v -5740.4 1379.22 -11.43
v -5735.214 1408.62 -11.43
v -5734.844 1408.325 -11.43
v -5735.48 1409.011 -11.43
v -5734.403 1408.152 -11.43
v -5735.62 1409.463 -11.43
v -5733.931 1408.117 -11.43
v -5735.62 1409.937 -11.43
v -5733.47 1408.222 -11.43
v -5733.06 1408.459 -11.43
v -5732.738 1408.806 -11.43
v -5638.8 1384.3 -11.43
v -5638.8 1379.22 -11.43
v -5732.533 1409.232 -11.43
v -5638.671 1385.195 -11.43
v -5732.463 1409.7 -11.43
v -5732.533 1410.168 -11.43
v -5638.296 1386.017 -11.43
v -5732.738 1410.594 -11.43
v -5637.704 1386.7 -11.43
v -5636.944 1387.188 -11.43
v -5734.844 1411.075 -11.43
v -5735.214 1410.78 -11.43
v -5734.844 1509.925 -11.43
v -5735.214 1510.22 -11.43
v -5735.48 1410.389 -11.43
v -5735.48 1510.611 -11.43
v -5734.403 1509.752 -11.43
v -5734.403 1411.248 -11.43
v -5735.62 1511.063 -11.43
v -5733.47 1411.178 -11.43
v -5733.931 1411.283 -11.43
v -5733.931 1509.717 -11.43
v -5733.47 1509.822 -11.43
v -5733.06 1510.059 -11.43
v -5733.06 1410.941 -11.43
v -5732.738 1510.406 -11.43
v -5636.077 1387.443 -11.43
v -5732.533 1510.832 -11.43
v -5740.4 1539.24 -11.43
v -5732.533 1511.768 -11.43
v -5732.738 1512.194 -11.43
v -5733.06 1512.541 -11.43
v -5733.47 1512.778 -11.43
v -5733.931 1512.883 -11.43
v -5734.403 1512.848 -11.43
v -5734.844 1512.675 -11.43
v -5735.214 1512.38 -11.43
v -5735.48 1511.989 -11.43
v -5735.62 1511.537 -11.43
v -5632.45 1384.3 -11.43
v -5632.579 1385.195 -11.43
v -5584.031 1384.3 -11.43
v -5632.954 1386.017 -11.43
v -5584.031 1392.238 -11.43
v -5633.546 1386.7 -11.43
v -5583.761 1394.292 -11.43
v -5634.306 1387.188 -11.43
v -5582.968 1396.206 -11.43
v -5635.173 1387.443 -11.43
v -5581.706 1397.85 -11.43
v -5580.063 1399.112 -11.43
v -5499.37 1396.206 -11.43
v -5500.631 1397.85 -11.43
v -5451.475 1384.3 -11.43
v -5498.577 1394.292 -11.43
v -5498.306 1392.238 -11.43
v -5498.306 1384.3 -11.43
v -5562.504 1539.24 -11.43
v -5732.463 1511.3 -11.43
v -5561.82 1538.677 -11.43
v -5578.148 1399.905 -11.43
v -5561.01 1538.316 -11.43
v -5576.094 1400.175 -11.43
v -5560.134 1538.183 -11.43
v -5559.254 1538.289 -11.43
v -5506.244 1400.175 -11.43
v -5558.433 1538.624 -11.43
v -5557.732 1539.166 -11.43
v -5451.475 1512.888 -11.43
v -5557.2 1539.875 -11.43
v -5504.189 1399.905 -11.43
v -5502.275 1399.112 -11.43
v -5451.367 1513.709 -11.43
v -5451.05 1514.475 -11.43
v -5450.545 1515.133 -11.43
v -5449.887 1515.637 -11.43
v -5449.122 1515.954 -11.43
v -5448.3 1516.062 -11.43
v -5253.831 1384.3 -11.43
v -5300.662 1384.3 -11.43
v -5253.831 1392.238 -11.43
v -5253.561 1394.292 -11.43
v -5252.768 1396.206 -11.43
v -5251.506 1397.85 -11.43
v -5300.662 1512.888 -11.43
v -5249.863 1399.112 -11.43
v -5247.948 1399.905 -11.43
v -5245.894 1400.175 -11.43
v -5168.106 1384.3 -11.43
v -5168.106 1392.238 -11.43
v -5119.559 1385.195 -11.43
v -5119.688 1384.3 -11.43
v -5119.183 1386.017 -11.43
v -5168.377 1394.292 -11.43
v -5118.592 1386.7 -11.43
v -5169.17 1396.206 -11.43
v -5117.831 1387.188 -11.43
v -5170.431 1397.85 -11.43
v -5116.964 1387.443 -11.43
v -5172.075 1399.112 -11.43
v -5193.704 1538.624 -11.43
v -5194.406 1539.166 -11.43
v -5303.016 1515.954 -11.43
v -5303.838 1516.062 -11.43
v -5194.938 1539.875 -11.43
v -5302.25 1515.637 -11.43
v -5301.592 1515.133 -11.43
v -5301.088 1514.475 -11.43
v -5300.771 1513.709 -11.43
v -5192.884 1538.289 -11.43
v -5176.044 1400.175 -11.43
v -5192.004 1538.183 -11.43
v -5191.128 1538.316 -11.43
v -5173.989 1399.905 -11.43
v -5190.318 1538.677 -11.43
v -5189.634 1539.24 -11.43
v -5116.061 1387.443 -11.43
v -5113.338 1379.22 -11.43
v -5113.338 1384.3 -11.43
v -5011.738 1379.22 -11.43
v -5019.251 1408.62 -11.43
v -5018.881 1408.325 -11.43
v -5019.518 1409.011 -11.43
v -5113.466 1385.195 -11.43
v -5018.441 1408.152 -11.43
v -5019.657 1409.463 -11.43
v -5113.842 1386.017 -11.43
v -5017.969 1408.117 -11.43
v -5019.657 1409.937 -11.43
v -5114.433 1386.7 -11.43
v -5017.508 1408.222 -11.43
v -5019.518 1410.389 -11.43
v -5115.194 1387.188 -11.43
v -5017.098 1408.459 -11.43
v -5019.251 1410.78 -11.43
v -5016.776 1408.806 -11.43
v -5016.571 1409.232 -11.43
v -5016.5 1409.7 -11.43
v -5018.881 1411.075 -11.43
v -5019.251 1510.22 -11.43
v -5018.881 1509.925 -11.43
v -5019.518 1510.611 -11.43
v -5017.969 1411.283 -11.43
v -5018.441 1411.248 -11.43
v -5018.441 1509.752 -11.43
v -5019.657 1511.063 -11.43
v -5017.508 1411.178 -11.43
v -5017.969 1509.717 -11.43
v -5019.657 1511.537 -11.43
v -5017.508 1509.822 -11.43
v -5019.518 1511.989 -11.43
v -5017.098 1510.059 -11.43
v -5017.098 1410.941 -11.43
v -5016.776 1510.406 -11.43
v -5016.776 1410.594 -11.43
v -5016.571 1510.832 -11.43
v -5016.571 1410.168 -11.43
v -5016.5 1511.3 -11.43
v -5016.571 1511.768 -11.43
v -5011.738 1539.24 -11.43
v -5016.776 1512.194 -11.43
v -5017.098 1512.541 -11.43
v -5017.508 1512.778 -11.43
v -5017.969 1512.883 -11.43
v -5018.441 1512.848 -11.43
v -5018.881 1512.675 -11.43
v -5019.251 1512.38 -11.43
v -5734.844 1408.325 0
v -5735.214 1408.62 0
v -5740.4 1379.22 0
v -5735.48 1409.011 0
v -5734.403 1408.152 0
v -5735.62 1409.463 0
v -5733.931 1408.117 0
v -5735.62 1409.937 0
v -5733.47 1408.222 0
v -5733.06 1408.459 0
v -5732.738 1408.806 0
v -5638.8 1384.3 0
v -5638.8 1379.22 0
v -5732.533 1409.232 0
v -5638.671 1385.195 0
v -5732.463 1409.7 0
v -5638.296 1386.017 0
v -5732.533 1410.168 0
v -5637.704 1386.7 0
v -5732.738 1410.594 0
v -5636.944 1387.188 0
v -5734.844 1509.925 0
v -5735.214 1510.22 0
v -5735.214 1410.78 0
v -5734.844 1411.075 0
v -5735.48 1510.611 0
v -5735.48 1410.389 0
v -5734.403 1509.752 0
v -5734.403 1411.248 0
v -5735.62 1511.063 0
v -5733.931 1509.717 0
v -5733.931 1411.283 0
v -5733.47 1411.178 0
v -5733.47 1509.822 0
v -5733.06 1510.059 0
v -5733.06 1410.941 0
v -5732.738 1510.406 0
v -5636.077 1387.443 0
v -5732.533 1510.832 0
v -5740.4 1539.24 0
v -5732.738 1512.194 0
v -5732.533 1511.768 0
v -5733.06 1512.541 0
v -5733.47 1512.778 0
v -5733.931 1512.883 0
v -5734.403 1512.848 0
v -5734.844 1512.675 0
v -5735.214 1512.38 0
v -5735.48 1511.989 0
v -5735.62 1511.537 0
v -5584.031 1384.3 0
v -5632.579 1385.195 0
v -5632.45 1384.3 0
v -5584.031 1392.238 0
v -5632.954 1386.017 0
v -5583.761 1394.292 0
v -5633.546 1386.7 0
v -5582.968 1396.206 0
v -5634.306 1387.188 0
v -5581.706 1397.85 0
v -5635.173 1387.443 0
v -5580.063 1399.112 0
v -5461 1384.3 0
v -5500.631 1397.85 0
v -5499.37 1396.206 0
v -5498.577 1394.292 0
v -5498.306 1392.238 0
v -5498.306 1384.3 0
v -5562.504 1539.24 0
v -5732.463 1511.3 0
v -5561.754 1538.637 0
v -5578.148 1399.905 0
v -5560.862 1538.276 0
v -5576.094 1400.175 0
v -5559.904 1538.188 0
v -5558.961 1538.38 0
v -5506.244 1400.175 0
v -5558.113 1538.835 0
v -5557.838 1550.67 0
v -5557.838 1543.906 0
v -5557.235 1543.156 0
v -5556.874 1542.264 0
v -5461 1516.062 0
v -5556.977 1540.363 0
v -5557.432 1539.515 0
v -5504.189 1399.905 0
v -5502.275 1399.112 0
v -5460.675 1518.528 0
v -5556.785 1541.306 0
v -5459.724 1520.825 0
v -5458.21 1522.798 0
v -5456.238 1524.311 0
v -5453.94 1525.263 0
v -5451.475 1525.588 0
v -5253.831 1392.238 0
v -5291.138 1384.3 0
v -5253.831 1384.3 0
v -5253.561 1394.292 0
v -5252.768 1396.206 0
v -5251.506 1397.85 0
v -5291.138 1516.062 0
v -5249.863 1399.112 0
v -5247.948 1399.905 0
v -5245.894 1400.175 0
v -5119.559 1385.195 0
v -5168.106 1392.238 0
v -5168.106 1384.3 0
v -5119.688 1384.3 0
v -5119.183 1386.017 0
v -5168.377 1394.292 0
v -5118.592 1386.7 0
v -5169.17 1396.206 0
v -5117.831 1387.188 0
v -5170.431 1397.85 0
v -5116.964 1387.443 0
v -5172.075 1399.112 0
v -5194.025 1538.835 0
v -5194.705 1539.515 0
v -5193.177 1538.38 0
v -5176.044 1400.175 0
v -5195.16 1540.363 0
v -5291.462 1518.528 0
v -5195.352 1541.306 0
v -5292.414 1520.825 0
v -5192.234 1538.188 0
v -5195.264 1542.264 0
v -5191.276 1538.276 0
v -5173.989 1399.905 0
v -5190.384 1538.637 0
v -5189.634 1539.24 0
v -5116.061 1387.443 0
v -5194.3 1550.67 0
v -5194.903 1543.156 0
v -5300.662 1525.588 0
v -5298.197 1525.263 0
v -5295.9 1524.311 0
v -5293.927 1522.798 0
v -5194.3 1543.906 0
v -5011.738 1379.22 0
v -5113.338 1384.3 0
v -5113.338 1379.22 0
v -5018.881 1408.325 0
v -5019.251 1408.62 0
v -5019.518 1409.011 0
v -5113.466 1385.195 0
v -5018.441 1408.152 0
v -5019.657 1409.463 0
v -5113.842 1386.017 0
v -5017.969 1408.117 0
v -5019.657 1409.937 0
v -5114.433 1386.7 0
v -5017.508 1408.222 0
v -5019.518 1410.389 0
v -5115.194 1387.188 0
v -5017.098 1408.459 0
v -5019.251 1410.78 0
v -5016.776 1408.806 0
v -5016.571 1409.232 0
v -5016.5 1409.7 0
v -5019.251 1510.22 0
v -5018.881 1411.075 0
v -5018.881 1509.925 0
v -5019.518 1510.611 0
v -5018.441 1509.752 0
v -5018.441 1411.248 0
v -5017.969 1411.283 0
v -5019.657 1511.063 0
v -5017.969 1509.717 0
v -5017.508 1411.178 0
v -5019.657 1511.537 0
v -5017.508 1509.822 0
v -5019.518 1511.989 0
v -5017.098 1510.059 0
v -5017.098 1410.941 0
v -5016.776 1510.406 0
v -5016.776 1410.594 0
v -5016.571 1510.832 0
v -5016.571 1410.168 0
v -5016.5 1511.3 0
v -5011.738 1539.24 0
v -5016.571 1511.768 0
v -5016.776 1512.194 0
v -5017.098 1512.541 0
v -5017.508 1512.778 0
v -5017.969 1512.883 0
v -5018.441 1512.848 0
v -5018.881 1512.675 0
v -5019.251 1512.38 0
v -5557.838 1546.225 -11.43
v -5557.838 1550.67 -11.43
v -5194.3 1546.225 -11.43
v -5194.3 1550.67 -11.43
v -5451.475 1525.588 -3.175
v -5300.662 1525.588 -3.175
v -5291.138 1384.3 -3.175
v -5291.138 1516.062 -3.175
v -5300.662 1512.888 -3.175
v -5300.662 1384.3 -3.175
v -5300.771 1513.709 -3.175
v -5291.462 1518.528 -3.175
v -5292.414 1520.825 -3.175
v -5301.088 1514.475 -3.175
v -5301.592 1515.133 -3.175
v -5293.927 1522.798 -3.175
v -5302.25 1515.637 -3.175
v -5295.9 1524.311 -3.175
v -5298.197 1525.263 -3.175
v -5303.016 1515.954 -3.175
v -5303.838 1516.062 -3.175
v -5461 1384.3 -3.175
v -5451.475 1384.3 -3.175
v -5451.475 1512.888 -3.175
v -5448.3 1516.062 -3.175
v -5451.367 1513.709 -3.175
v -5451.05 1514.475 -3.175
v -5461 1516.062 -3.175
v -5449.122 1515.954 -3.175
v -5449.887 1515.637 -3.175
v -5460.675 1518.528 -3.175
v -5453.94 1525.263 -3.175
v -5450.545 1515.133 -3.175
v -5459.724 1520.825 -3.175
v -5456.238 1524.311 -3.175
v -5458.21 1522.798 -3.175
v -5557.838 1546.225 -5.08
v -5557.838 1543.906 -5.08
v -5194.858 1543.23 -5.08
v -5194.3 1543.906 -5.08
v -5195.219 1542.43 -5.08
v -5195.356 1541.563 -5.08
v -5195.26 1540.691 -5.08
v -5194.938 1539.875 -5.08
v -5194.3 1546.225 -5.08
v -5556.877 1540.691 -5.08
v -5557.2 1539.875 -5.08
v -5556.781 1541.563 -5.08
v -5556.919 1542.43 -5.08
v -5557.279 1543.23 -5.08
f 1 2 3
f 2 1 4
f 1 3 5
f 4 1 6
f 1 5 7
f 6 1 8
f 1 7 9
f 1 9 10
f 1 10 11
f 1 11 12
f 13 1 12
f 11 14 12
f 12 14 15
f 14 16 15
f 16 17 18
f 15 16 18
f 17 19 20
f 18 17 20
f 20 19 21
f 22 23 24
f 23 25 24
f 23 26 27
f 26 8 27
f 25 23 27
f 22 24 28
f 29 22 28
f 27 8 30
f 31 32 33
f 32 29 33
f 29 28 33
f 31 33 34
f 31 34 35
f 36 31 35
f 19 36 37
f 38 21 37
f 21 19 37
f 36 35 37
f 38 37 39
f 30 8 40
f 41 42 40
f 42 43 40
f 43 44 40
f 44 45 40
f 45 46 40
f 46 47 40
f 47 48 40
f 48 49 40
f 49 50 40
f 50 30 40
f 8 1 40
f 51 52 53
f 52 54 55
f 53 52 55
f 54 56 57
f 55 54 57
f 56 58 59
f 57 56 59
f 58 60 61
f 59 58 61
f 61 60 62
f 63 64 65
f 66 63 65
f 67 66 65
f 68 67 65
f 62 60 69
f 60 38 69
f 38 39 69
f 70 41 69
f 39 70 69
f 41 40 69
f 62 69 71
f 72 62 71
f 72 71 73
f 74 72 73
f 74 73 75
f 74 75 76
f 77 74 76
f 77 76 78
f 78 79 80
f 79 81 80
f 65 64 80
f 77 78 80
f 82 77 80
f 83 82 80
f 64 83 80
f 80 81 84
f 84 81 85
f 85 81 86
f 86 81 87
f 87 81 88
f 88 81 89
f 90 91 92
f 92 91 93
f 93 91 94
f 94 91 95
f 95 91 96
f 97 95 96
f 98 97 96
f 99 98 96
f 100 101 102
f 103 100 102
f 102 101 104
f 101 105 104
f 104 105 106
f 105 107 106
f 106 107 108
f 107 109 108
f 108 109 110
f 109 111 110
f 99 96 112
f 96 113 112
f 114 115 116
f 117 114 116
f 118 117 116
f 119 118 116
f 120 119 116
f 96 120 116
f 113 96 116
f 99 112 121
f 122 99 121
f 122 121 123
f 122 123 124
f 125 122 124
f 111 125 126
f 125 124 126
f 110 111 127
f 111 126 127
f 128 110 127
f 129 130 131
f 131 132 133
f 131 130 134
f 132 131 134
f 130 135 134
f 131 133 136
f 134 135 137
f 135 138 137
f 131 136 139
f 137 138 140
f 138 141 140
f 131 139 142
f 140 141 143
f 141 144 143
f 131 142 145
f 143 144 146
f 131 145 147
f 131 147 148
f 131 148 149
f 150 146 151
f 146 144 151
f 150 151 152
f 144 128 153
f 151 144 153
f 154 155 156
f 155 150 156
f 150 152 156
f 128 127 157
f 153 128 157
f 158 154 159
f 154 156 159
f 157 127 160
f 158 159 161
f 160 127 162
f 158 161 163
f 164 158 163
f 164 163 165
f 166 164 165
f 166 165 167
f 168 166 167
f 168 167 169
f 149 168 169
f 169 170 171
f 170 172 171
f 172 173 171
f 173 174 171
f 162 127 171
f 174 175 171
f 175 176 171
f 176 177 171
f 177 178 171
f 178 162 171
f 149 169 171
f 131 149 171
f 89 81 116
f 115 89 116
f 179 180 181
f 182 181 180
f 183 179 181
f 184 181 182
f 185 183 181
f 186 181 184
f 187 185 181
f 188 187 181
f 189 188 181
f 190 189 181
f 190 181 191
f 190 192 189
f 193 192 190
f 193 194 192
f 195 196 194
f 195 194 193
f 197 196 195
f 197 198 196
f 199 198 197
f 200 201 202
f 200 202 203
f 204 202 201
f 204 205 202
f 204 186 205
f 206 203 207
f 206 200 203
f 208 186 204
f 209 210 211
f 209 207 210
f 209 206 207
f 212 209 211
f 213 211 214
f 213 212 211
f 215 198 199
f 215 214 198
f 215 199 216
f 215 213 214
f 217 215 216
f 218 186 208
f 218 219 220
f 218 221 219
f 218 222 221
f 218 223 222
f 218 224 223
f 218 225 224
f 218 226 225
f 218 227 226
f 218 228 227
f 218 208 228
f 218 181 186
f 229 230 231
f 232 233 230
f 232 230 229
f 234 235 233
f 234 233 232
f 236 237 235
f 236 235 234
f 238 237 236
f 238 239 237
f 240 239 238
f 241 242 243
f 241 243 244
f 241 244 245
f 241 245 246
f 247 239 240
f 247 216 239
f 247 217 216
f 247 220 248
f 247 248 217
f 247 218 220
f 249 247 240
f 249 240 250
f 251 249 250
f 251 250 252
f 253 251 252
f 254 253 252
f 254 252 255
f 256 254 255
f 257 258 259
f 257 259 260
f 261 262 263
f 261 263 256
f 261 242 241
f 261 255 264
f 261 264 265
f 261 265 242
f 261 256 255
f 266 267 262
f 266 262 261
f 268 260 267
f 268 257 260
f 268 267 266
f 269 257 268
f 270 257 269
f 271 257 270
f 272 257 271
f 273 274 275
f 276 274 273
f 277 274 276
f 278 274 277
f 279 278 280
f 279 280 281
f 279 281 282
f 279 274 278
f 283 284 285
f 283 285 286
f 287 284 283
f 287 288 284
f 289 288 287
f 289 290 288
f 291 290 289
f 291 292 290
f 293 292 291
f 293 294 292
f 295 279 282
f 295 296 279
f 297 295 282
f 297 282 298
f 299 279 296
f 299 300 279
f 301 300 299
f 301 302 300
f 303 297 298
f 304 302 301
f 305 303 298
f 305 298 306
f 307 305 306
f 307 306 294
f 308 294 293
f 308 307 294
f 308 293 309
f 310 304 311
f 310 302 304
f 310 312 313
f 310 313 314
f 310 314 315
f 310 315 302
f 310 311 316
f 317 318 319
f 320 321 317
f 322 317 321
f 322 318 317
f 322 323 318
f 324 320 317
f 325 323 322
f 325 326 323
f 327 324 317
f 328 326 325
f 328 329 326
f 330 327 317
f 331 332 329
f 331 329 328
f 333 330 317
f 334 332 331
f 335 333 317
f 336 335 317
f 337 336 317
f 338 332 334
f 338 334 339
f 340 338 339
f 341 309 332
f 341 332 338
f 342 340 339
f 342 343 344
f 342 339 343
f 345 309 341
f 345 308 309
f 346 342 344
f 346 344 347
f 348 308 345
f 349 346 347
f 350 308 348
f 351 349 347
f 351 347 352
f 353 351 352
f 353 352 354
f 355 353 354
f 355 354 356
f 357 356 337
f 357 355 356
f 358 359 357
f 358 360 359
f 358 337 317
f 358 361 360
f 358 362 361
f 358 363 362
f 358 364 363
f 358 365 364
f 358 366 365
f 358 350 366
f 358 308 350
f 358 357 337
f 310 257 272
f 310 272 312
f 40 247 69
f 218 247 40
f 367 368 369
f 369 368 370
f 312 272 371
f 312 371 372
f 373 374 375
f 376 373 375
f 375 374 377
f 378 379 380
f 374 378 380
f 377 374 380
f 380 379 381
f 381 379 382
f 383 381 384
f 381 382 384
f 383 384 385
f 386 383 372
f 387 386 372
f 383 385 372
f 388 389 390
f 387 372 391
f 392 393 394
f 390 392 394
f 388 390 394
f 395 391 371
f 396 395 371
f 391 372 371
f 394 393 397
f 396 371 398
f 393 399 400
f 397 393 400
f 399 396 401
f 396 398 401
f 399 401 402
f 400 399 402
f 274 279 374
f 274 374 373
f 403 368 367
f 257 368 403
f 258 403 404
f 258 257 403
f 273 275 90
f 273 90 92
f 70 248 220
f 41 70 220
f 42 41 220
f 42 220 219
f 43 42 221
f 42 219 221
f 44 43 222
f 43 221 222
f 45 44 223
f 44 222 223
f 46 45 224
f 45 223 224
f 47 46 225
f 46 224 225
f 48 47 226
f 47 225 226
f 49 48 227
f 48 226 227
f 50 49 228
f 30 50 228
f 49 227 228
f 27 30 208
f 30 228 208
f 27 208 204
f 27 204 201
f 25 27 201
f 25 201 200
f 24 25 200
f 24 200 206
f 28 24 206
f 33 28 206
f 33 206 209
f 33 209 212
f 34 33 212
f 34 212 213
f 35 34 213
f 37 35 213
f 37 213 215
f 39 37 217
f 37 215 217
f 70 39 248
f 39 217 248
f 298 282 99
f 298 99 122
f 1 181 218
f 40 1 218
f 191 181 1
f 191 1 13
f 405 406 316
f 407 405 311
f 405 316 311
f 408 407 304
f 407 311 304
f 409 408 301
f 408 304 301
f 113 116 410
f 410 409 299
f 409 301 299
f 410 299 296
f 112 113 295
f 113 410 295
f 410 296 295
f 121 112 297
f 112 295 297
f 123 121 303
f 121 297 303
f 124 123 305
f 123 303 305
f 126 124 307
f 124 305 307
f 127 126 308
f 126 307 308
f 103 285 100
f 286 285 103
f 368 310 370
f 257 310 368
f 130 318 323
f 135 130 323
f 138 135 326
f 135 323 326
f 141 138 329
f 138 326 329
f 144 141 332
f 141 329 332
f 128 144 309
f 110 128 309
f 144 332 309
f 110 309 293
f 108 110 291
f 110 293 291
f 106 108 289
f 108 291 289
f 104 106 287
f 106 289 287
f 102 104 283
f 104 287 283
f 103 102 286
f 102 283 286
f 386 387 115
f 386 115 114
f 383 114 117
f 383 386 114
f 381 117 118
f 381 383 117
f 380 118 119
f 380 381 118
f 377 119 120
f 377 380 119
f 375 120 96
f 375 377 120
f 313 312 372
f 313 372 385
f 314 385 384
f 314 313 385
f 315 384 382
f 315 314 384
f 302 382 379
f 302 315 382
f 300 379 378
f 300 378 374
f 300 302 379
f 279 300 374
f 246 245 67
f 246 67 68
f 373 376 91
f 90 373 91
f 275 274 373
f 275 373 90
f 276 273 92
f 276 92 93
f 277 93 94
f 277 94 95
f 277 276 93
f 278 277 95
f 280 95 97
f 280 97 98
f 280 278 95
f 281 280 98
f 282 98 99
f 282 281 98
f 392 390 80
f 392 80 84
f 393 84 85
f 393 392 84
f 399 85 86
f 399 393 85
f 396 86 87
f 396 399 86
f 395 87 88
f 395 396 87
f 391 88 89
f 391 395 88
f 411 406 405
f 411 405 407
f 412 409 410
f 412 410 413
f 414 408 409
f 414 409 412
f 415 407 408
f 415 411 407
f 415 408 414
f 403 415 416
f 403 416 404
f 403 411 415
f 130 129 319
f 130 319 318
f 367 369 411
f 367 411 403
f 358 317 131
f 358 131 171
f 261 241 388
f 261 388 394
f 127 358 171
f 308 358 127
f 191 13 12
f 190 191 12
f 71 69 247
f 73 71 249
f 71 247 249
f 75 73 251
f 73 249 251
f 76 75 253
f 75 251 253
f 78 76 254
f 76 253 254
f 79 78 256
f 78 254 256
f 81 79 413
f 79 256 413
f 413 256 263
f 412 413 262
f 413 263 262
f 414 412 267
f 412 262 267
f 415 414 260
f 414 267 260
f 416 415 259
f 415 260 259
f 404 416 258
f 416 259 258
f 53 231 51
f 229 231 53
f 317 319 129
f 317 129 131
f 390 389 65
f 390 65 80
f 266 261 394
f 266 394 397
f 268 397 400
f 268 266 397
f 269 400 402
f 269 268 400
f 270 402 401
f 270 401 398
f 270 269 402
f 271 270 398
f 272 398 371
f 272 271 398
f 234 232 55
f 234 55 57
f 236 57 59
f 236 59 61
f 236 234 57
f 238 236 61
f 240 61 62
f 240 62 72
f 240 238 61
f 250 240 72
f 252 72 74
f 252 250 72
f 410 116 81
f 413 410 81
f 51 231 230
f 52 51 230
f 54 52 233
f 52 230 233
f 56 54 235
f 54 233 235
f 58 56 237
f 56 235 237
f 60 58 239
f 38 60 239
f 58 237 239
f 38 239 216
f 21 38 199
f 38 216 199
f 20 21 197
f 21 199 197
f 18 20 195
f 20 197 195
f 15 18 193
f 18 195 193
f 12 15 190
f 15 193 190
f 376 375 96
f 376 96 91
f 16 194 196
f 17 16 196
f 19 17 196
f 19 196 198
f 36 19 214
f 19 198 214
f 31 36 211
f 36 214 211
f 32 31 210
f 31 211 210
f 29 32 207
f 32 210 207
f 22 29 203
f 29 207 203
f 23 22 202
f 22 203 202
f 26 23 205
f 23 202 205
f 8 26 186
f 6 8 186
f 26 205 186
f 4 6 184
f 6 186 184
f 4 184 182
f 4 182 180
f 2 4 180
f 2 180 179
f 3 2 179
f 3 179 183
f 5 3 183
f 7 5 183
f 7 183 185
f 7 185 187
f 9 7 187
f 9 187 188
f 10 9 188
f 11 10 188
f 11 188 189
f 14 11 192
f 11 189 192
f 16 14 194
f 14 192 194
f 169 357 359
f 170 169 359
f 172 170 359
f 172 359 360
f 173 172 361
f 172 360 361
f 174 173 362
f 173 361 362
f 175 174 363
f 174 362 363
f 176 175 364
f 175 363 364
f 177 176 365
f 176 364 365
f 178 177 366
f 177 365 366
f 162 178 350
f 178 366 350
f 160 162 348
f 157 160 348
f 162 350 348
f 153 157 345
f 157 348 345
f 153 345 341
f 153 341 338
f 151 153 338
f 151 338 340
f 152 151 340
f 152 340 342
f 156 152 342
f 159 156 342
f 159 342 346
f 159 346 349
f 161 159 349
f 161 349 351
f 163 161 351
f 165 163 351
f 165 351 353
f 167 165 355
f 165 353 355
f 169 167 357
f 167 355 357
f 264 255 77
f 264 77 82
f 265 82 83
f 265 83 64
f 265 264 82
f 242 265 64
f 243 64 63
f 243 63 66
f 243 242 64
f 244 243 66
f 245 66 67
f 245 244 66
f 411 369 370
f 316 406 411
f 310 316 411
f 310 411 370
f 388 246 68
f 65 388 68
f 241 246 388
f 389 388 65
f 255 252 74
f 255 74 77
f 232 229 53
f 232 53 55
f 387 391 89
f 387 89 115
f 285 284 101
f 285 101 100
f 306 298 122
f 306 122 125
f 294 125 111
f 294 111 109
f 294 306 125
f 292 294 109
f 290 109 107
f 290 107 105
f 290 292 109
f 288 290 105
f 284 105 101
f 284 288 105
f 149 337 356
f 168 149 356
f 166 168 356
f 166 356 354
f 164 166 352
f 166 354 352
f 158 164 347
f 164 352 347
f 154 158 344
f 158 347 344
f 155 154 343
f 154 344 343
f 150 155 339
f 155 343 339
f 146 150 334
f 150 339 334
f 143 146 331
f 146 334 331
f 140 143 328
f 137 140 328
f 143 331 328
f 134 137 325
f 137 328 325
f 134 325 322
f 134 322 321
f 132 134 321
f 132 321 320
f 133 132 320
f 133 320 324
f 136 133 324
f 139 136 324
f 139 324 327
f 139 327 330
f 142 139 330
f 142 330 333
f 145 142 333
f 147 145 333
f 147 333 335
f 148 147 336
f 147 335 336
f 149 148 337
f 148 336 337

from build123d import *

# Parameters (mm, degrees)
THICKNESS_MAINOUTLINE_DEPTH = 11.43
CORNERPOCKETRADIUS_R        = 3.302
CUT_EXTRUDE4_DEPTH          = 11.43
FLANGEDEPTH_DEPTH           = 3.175
SCREWHOLES_R                = 1.5875
CUT_EXTRUDE2_DEPTH          = 11.43
PLEXCHANNEL_W               = 363.5375
PLEXCHANNEL_H               = 6.35
PLEXCHANNEL_DEPTH_DEPTH     = 6.35
SKETCH7_W                   = 101.6
SKETCH7_H                   = 5.08
EXTRUDE2_DEPTH              = 11.43
SKETCH8_R                   = 3.175
CUT_EXTRUDE5_DEPTH          = 11.43


with BuildPart() as part:
    # MainOutline → Thickness_MainOutline (new body)
    with BuildSketch(Plane.XY):
        with BuildLine():
            Line((-5740.4, 1539.24), (-5740.4, 1384.3))
            Line((-5740.4, 1384.3), (-5584.03125, 1384.3))
            Line((-5584.03125, 1384.3), (-5584.03125, 1392.2375))
            ThreePointArc((-5584.03125, 1392.2375), (-5581.706410076, 1397.850160076), (-5576.09375, 1400.175))
            Line((-5576.09375, 1400.175), (-5506.24375, 1400.175))
            ThreePointArc((-5506.24375, 1400.175), (-5500.631089924, 1397.850160076), (-5498.30625, 1392.2375))
            Line((-5498.30625, 1392.2375), (-5498.30625, 1384.3))
            Line((-5498.30625, 1384.3), (-5451.475, 1384.3))
            Line((-5451.475, 1384.3), (-5451.475, 1512.8875))
            ThreePointArc((-5451.475, 1512.8875), (-5450.54506403, 1515.13256403), (-5448.3, 1516.0625))
            Line((-5448.3, 1516.0625), (-5303.8375, 1516.0625))
            ThreePointArc((-5303.8375, 1516.0625), (-5301.59243597, 1515.13256403), (-5300.6625, 1512.8875))
            Line((-5300.6625, 1512.8875), (-5300.6625, 1384.3))
            Line((-5300.6625, 1384.3), (-5253.83125, 1384.3))
            Line((-5253.83125, 1384.3), (-5253.83125, 1392.2375))
            ThreePointArc((-5253.83125, 1392.2375), (-5251.506410076, 1397.850160076), (-5245.89375, 1400.175))
            Line((-5245.89375, 1400.175), (-5176.04375, 1400.175))
            ThreePointArc((-5176.04375, 1400.175), (-5170.431089924, 1397.850160076), (-5168.10625, 1392.2375))
            Line((-5168.10625, 1392.2375), (-5168.10625, 1384.3))
            Line((-5168.10625, 1384.3), (-5011.7375, 1384.3))
            Line((-5011.7375, 1384.3), (-5011.7375, 1539.24))
            Line((-5011.7375, 1539.24), (-5194.3, 1539.24))
            Line((-5194.3, 1539.24), (-5194.3, 1550.67))
            Line((-5194.3, 1550.67), (-5557.8375, 1550.67))
            Line((-5557.8375, 1550.67), (-5557.8375, 1539.24))
            Line((-5557.8375, 1539.24), (-5740.4, 1539.24))
        make_face()
    extrude(amount=-THICKNESS_MAINOUTLINE_DEPTH)

    # CornerPocketRadius → Cut-Extrude4 (cut)
    with BuildSketch(Plane.XY):
        with Locations((-5560.08256403, 1541.48506403)):
            Circle(CORNERPOCKETRADIUS_R)
        with Locations((-5192.05493597, 1541.48506403)):
            Circle(CORNERPOCKETRADIUS_R)
    extrude(amount=-CUT_EXTRUDE4_DEPTH, mode=Mode.SUBTRACT)

    # PowerBoxFlange → FlangeDepth (cut)
    with BuildSketch(Plane.XY):
        with BuildLine():
            Line((-5297.4875, 1377.95), (-5454.65, 1377.95))
            ThreePointArc((-5454.65, 1377.95), (-5459.140128061, 1379.809871939), (-5461, 1384.3))
            Line((-5461, 1384.3), (-5461, 1516.0625))
            ThreePointArc((-5461, 1516.0625), (-5458.210192091, 1522.797692091), (-5451.475, 1525.5875))
            Line((-5451.475, 1525.5875), (-5300.6625, 1525.5875))
            ThreePointArc((-5300.6625, 1525.5875), (-5293.927307909, 1522.797692091), (-5291.1375, 1516.0625))
            Line((-5291.1375, 1516.0625), (-5291.1375, 1384.3))
            ThreePointArc((-5291.1375, 1384.3), (-5292.997371939, 1379.809871939), (-5297.4875, 1377.95))
        make_face()
    extrude(amount=-FLANGEDEPTH_DEPTH, mode=Mode.SUBTRACT)

    # ScrewHoles → Cut-Extrude2 (cut)
    with BuildSketch(Plane.XY):
        with Locations((-5734.05, 1511.3)):
            Circle(SCREWHOLES_R)
        with Locations((-5734.05, 1409.7)):
            Circle(SCREWHOLES_R)
        with Locations((-5018.0875, 1409.7)):
            Circle(SCREWHOLES_R)
        with Locations((-5018.0875, 1511.3)):
            Circle(SCREWHOLES_R)
    extrude(amount=-CUT_EXTRUDE2_DEPTH, mode=Mode.SUBTRACT)

    # PlexChannel → PlexChannel_Depth (cut)
    with BuildSketch(Plane(origin=(0, 0, -11.43), x_dir=(-1, 0, 0), z_dir=(0, 0, -1))):
        with Locations((5376.06875, 1543.05)):
            Rectangle(PLEXCHANNEL_W, PLEXCHANNEL_H)
    extrude(amount=-PLEXCHANNEL_DEPTH_DEPTH, mode=Mode.SUBTRACT)

    # Sketch7 → Extrude2 (add)
    with BuildSketch(Plane.XY):
        with Locations((-5689.6, 1381.76)):
            Rectangle(SKETCH7_W, SKETCH7_H)
        with Locations((-5062.5375, 1381.76)):
            Rectangle(SKETCH7_W, SKETCH7_H)
    extrude(amount=-EXTRUDE2_DEPTH)

    # Sketch8 → Cut-Extrude5 (cut)
    with BuildSketch(Plane.XY):
        with Locations((-5635.625, 1384.3)):
            Circle(SKETCH8_R)
        with Locations((-5116.5125, 1384.3)):
            Circle(SKETCH8_R)
    extrude(amount=-CUT_EXTRUDE5_DEPTH, mode=Mode.SUBTRACT)


solid = part.part
